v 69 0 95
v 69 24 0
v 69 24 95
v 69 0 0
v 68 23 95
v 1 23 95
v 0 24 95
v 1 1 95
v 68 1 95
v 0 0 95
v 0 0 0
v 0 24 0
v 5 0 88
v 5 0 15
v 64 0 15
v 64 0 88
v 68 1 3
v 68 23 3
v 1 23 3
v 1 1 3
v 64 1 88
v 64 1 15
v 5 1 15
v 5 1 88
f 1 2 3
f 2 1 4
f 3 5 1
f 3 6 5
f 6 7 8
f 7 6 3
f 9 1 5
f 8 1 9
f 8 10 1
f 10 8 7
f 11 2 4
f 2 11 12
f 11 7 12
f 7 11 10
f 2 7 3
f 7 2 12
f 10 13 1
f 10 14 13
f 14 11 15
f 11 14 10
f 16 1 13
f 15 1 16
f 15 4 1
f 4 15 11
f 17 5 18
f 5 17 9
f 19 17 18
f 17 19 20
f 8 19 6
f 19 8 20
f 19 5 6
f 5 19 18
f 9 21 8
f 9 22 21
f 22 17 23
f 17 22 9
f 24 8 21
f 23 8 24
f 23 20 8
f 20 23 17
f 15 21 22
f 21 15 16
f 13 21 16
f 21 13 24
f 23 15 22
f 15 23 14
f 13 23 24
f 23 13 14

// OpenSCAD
//67x93x22
x=67;
y=22;
z=93;
//square([x+4,y+4]);
difference() {
    translate([0,0,0])
    cube([x+2,y+2,z+2]);
    translate([1,1,3])
    cube([x,y,z]);
    translate([5,0,15])
    cube([x-8,y,z-20]);
}
